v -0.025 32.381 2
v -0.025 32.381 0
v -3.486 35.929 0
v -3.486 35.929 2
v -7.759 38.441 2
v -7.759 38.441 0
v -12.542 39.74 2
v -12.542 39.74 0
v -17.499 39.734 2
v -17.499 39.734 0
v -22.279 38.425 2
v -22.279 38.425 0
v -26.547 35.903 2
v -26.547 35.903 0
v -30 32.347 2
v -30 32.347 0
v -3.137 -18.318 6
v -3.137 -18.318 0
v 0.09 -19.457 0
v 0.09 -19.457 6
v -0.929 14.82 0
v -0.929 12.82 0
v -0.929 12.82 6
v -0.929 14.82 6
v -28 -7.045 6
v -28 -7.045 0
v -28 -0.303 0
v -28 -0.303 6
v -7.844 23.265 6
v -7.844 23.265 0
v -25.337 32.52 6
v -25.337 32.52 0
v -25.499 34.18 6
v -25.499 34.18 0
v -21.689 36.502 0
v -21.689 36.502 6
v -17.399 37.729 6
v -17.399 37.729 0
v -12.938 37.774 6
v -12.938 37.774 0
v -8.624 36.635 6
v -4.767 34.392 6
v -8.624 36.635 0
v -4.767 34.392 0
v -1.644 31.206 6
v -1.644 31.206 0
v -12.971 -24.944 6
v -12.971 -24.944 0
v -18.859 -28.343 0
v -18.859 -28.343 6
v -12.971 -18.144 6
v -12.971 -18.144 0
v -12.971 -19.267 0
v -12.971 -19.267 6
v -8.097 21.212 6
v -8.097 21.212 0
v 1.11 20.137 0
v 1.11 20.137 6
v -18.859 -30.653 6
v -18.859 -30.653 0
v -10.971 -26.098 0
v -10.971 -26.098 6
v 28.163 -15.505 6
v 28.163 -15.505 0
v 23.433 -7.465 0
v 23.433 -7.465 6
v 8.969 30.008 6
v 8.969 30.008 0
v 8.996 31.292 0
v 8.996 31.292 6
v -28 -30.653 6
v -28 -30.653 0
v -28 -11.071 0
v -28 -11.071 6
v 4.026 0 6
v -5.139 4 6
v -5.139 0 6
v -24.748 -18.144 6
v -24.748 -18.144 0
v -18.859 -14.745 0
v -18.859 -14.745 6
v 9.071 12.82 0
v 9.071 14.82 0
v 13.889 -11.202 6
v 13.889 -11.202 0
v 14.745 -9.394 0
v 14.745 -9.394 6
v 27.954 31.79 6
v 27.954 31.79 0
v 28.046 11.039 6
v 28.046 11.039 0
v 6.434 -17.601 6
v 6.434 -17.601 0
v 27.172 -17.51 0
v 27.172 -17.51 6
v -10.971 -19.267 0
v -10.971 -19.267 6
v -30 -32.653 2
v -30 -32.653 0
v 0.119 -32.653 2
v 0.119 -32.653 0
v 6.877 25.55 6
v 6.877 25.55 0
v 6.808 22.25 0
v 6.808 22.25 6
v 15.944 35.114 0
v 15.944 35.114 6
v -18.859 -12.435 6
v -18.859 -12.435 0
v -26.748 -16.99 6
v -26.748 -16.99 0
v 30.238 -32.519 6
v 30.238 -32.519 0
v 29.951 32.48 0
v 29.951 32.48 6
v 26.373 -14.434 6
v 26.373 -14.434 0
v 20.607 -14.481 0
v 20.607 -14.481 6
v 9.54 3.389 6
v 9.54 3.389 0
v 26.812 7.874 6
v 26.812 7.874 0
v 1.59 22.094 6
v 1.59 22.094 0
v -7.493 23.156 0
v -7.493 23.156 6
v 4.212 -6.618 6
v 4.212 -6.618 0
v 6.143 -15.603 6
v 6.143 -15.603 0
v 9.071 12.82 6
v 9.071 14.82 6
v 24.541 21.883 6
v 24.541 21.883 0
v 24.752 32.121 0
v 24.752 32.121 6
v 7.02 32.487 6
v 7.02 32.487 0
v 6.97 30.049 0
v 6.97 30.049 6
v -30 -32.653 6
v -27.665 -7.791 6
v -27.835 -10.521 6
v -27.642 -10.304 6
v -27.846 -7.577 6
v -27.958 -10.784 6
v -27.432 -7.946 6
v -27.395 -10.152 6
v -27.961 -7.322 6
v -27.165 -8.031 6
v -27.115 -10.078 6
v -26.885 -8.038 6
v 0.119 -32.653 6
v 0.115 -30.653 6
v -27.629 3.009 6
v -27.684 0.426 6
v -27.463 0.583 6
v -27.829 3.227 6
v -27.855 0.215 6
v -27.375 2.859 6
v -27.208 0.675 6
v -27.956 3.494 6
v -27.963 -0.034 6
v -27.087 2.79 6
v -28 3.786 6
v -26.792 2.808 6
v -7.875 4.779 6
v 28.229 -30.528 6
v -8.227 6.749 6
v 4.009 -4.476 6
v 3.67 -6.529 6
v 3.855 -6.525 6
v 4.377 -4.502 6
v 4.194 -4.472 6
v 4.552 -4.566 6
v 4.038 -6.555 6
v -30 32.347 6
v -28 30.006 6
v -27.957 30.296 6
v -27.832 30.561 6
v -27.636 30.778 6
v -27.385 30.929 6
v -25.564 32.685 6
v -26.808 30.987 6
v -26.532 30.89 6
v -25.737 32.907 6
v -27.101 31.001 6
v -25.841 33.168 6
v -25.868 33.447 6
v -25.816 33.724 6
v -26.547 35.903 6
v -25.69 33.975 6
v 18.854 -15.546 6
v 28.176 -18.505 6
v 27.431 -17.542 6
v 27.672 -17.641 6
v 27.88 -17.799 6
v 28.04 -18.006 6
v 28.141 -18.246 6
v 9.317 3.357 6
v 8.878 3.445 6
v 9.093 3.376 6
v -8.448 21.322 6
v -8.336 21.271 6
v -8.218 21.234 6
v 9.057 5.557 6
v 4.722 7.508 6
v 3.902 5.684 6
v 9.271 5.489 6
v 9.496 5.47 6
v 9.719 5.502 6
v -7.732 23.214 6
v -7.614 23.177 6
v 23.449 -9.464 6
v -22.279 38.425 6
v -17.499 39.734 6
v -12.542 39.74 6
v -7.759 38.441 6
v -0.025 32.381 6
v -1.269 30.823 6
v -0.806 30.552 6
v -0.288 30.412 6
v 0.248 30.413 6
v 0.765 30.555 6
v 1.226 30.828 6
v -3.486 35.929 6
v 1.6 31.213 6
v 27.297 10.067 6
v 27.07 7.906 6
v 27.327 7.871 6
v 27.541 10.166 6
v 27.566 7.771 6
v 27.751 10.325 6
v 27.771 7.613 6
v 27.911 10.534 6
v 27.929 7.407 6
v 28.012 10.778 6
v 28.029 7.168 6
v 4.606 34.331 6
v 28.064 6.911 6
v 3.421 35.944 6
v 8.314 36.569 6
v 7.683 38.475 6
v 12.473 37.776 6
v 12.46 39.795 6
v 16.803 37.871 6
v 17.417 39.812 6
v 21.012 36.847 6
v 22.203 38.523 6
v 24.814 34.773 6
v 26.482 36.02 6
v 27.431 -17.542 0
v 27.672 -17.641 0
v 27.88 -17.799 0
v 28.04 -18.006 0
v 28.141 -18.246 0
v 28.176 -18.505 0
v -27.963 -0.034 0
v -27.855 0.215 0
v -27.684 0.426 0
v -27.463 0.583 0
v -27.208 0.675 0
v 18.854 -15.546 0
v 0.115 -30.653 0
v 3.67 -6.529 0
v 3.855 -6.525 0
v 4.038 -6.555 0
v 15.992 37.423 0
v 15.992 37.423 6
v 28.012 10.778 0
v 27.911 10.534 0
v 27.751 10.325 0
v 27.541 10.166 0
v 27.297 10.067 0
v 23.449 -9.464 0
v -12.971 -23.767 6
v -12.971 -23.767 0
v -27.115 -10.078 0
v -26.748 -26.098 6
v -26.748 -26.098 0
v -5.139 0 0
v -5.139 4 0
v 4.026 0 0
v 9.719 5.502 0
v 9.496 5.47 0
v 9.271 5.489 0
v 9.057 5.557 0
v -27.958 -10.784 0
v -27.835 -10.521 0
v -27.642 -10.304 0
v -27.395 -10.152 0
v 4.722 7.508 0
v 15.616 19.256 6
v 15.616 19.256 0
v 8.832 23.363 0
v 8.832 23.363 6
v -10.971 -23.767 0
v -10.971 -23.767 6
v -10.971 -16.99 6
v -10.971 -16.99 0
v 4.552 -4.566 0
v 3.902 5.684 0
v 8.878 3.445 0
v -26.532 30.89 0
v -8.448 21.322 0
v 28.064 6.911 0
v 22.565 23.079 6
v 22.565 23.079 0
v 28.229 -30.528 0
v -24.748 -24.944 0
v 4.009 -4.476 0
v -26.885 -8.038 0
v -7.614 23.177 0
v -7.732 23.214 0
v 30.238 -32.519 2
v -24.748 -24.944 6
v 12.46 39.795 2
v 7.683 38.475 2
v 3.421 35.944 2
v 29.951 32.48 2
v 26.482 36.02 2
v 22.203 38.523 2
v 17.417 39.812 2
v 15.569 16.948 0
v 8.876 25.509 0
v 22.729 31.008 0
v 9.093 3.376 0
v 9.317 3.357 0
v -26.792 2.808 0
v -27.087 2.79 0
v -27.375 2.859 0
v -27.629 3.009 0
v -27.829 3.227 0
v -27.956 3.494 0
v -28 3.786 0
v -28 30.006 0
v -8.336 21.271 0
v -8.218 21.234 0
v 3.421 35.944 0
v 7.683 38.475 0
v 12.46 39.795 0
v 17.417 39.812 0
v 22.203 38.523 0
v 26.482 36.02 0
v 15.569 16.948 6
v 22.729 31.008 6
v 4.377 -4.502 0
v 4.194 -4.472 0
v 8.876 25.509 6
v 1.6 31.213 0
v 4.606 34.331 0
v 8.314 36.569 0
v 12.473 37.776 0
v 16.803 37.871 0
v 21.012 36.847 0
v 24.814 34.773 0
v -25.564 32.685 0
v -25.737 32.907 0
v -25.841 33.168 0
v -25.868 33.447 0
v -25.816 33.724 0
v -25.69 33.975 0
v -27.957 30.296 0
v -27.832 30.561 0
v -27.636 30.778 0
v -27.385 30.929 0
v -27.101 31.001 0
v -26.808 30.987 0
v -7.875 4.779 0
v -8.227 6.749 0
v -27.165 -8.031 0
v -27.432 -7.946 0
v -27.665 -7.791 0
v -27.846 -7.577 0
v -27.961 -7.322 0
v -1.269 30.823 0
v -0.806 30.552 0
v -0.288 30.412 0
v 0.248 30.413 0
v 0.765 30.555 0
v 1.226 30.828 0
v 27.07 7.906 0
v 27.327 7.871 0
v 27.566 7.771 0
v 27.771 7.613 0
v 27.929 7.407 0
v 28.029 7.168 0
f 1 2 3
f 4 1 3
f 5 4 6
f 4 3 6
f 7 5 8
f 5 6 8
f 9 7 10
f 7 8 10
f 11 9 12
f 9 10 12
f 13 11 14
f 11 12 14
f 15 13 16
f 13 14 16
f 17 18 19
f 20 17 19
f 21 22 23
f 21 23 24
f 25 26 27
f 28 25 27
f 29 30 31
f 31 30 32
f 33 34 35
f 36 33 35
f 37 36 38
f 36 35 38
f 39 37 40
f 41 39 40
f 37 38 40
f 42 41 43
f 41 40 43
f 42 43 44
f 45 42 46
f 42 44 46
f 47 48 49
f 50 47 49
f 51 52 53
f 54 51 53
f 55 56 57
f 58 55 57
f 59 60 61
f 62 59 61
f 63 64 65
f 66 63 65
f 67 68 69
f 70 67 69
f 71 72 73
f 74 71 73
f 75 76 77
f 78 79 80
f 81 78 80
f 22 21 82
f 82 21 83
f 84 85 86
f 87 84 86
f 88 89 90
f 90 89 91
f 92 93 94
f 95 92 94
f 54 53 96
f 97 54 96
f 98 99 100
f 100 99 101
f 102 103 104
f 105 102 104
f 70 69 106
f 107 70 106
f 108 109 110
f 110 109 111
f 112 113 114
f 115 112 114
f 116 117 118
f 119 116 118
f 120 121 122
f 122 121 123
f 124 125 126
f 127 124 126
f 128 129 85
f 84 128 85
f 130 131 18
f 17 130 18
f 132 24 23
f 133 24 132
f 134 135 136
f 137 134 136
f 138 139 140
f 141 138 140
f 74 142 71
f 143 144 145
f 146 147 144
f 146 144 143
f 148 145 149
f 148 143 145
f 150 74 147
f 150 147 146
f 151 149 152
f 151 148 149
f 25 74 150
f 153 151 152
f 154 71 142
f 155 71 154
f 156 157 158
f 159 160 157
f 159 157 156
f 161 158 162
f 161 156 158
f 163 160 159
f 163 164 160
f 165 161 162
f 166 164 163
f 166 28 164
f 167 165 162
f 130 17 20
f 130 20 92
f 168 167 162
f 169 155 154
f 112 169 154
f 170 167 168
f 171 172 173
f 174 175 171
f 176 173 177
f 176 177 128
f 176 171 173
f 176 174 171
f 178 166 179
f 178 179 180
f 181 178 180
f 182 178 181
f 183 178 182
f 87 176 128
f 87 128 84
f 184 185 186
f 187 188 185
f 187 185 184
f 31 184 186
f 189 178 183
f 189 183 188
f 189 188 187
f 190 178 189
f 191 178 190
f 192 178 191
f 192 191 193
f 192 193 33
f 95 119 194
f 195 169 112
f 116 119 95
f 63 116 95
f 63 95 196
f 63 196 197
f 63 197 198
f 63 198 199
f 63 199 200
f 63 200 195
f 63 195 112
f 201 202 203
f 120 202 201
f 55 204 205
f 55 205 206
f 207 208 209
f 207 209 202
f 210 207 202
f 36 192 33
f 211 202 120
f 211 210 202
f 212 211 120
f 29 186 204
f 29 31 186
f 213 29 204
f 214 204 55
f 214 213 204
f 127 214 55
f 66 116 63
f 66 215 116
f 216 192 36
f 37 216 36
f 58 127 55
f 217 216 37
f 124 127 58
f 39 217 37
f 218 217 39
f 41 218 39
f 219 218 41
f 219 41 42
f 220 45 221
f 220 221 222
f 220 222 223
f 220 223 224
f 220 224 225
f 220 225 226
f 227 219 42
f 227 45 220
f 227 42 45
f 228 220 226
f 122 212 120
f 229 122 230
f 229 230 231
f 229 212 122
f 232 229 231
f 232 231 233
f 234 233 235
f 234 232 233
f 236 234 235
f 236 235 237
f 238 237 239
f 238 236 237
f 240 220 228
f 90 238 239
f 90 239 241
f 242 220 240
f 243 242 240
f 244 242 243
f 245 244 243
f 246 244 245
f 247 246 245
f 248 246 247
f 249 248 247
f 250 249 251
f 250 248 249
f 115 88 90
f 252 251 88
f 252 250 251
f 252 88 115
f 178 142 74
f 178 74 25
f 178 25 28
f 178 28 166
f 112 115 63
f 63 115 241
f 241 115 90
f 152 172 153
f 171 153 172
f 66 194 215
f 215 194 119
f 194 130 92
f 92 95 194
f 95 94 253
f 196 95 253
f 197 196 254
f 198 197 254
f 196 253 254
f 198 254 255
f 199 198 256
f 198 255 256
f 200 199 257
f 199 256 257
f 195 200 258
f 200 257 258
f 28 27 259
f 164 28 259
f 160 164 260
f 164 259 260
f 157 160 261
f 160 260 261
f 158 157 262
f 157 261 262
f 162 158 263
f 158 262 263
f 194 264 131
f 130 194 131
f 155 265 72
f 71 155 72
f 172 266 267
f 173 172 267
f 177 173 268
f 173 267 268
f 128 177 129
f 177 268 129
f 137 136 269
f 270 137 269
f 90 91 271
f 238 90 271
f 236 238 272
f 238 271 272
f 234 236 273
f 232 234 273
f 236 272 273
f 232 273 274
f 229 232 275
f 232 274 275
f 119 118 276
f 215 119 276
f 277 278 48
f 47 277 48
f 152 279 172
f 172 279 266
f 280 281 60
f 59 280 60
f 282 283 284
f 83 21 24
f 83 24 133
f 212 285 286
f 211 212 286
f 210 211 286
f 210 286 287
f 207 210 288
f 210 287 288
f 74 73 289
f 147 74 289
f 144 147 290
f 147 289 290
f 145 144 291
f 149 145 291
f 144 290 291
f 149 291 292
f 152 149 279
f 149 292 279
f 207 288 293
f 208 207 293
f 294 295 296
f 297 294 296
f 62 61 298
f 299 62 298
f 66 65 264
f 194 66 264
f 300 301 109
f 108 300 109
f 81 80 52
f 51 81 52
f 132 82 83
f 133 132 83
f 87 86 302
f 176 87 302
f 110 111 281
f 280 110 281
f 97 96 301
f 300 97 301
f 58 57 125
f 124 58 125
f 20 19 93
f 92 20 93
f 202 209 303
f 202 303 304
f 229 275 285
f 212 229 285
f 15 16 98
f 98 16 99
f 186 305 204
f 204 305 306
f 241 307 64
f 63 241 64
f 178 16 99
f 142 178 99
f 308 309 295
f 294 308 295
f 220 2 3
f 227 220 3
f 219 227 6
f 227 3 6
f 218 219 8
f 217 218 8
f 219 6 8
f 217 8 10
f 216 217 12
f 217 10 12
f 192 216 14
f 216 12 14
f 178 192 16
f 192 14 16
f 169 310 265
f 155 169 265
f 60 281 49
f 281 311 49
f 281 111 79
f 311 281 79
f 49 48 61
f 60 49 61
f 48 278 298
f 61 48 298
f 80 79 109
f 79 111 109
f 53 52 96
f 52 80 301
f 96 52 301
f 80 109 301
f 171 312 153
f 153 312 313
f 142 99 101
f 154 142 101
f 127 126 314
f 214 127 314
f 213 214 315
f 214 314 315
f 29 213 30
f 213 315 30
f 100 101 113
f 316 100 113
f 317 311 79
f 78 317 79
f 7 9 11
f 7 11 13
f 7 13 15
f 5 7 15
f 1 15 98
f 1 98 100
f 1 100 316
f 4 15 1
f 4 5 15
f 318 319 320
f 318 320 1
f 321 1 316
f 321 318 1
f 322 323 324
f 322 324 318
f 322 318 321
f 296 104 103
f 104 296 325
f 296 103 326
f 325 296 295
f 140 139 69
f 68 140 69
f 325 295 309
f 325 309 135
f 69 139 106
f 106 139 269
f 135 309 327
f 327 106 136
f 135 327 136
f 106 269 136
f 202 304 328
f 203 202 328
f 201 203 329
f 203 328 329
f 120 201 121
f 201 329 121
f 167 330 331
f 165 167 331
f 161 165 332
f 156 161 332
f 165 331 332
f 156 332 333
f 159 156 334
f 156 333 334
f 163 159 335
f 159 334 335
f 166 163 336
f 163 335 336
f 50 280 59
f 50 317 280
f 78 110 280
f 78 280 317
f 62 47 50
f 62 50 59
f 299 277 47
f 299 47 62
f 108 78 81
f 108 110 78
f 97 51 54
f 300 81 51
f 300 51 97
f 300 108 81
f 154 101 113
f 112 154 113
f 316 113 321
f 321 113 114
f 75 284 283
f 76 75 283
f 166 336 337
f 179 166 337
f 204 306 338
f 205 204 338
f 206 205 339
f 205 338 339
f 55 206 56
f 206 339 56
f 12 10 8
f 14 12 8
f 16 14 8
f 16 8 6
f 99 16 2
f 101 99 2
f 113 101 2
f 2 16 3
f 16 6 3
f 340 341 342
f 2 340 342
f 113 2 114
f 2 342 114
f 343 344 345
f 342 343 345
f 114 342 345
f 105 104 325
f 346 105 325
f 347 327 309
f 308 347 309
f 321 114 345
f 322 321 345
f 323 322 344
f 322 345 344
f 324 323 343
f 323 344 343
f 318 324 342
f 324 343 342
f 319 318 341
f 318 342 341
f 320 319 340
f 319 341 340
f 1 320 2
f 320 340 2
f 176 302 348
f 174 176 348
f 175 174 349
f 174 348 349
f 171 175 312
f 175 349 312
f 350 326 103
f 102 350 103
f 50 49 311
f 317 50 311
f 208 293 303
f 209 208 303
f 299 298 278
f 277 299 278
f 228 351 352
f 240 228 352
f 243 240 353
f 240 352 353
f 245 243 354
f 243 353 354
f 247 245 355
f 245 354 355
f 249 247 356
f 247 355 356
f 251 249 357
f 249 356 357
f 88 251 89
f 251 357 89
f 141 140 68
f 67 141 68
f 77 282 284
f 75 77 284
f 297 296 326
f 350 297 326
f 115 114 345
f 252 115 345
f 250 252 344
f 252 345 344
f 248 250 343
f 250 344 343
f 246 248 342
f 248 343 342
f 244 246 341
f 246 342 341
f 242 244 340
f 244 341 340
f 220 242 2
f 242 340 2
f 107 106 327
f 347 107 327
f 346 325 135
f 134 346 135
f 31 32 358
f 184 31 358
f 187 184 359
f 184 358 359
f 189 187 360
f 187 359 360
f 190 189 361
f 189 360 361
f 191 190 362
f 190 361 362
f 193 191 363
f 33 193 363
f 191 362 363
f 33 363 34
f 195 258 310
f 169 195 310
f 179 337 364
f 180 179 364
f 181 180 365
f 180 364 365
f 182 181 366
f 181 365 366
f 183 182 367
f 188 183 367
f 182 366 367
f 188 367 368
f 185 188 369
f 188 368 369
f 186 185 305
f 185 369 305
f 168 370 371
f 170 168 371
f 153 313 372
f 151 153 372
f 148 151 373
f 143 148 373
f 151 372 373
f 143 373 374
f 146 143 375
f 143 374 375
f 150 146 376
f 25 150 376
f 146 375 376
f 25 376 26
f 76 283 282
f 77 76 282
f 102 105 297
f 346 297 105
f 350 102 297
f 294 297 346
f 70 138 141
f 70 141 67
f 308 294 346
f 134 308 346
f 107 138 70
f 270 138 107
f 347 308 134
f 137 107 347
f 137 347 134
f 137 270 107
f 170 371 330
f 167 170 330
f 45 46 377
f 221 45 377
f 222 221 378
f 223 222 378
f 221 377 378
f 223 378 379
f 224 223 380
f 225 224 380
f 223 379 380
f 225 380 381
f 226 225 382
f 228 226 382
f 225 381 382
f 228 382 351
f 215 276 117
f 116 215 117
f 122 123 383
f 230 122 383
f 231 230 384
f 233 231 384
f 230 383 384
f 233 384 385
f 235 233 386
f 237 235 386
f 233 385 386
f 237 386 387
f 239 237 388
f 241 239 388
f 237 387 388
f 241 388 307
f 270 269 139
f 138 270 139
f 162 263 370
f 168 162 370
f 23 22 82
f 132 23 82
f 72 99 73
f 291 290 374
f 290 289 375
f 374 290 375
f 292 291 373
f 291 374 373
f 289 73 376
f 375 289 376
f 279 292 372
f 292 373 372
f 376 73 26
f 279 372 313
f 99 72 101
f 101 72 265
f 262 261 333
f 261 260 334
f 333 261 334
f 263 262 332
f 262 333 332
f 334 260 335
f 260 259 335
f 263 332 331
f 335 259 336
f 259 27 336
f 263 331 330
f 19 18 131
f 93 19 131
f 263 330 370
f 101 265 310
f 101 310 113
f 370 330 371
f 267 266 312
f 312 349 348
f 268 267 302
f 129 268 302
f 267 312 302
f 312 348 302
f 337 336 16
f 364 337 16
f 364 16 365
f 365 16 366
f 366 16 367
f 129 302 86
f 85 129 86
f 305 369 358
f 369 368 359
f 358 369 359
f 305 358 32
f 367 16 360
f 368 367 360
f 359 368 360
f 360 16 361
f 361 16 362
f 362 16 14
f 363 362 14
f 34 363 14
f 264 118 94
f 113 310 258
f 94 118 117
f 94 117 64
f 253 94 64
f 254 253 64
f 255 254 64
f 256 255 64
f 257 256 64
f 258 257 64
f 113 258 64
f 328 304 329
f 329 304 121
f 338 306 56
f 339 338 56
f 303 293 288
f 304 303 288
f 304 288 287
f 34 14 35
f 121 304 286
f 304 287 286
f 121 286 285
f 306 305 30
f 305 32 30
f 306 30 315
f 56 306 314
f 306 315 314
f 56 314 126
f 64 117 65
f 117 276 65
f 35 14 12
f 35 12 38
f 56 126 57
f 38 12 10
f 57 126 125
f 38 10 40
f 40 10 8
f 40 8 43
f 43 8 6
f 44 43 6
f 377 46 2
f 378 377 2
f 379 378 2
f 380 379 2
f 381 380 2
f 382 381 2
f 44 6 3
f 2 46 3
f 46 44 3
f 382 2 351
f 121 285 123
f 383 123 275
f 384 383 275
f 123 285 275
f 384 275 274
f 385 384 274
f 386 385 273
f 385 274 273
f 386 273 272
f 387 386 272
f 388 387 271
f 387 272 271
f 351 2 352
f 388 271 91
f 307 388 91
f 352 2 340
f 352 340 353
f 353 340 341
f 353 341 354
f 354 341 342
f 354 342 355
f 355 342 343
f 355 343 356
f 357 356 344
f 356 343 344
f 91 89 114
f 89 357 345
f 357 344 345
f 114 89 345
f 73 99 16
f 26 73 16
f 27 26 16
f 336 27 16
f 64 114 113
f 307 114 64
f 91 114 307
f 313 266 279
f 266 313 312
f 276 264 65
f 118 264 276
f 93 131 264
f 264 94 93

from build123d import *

# Parameters (mm, degrees)
F1_DEPTH = 6
F0_W     = 10
F0_H     = 2
F3_DEPTH = 2


# Not quite as in the source:
# - ends of sketch curves that miss each other by under 0.0002 mm in the source are joined


with BuildPart() as f1:
    # F0 (on Top) → F1 (new body)
    with BuildSketch(Plane.XY):
        with BuildLine():
            Line((-30, 32.3473930837), (-30, -32.6526069163))
            Line((-30, -32.6526069163), (0.1192900786, -32.6526069163))
            Line((0.1192900786, -32.6526069163), (30.2382853209, -32.5193386265))
            Line((30.2382853209, -32.5193386265), (29.9506809711, 32.4800250915))
            ThreePointArc((29.9506809711, 32.4800250915), (14.938018386, 39.9687184444), (-0.0245860478, 32.3805016191))
            ThreePointArc((-0.0245860478, 32.3805016191), (-15.0206194621, 39.9024393927), (-30, 32.3473930837))
        make_face()
        with BuildLine():
            Line((-18.8592523336, -30.6526069163), (-28, -30.6526069163))
            Line((-28, -30.6526069163), (-28, -11.0710615659))
            ThreePointArc((-28, -11.0710615659), (-27.7465009831, -10.4056772542), (-27.1145274354, -10.0776414803))
            Line((-27.1145274354, -10.0776414803), (3.6698389075, -6.5286347923))
            ThreePointArc((3.6698389075, -6.5286347923), (3.9474323278, -6.5354397125), (4.2124526409, -6.6183170169))
            Line((4.2124526409, -6.6183170169), (13.8885083595, -11.2017112184))
            Line((13.8885083595, -11.2017112184), (14.7446809555, -9.3942354963))
            Line((14.7446809555, -9.3942354963), (4.5516618753, -4.5659639457))
            ThreePointArc((4.5516618753, -4.5659639457), (4.2866415622, -4.4830866414), (4.0090481419, -4.4762817211))
            Line((4.0090481419, -4.4762817211), (-26.8854725646, -8.0379876659))
            ThreePointArc((-26.8854725646, -8.0379876659), (-27.6653843117, -7.7910685633), (-28, -7.0445675803))
            Line((-28, -7.0445675803), (-28, -0.3031208943))
            ThreePointArc((-28, -0.3031208943), (-27.777063149, 0.3263017478), (-27.2076542751, 0.6750813864))
            Line((-27.2076542751, 0.6750813864), (-7.8752691202, 4.7789896525))
            Line((-7.8752691202, 4.7789896525), (-8.2269339416, 6.748904602))
            Line((-8.2269339416, 6.748904602), (-26.7923457249, 2.8078106154))
            ThreePointArc((-26.7923457249, 2.8078106154), (-27.6294226421, 3.0089497471), (-28, 3.7860128961))
            Line((-28, 3.7860128961), (-28, 30.0059348114))
            ThreePointArc((-28, 30.0059348114), (-27.5159136269, 30.8625754184), (-26.5323337407, 30.8898399364))
            Line((-26.5323337407, 30.8898399364), (-8.4484836928, 21.3218373695))
            ThreePointArc((-8.4484836928, 21.3218373695), (-8.2777475055, 21.2508432682), (-8.0968589797, 21.212498134))
            Line((-8.0968589797, 21.212498134), (1.1104592122, 20.1367996633))
            Line((1.1104592122, 20.1367996633), (1.589740147, 22.0944080593))
            Line((1.589740147, 22.0944080593), (-7.4926699193, 23.1555134121))
            ThreePointArc((-7.4926699193, 23.1555134121), (-7.673558445, 23.1938585463), (-7.8442946323, 23.2648526476))
            Line((-7.8442946323, 23.2648526476), (-25.336579259, 32.5198632656))
            ThreePointArc((-25.336579259, 32.5198632656), (-25.864176528, 33.3065546609), (-25.4987813298, 34.1804703197))
            ThreePointArc((-25.4987813298, 34.1804703197), (-12.9378201369, 37.7743931473), (-1.6438298189, 31.2063028557))
            ThreePointArc((-1.6438298189, 31.2063028557), (-0.0201923897, 30.3945345597), (1.599837329, 31.2134789892))
            ThreePointArc((1.599837329, 31.2134789892), (14.6353510123, 37.9648321663), (27.9537138644, 31.790158276))
            Line((27.9537138644, 31.790158276), (28.0455327124, 11.0388493912))
            ThreePointArc((28.0455327124, 11.0388493912), (27.837893783, 10.4243595923), (27.2969034481, 10.0665312879))
            Line((27.2969034481, 10.0665312879), (9.7187459346, 5.5015014827))
            ThreePointArc((9.7187459346, 5.5015014827), (9.3831012246, 5.4729531105), (9.0570203938, 5.557473361))
            Line((9.0570203938, 5.557473361), (4.7224049972, 7.5080498132))
            Line((4.7224049972, 7.5080498132), (3.9016758092, 5.6842067279))
            Line((3.9016758092, 5.6842067279), (8.8783137321, 3.4447202094))
            ThreePointArc((8.8783137321, 3.4447202094), (9.2043945629, 3.3601999588), (9.5400392729, 3.388748331))
            Line((9.5400392729, 3.388748331), (26.8124465698, 7.8743751129))
            ThreePointArc((26.8124465698, 7.8743751129), (27.6738726331, 7.6988329735), (28.0637977276, 6.9109063742))
            Line((28.0637977276, 6.9109063742), (28.1629825794, -15.5051393439))
            Line((28.1629825794, -15.5051393439), (23.4331540021, -7.4645135844))
            Line((23.4331540021, -7.4645135844), (18.8542303832, -15.5463280182))
            Line((18.8542303832, -15.5463280182), (6.1433850081, -15.6025700214))
            Line((6.1433850081, -15.6025700214), (-3.1372315382, -18.3176588576))
            Line((-3.1372315382, -18.3176588576), (0.0900974588, -19.4573196774))
            Line((0.0900974588, -19.4573196774), (6.4342668447, -17.6013025272))
            Line((6.4342668447, -17.6013025272), (27.1718417329, -17.5095444483))
            ThreePointArc((27.1718417329, -17.5095444483), (27.8802375517, -17.7993060772), (28.1762566263, -18.5051099771))
            Line((28.1762566263, -18.5051099771), (28.2294555342, -30.528207569))
            Line((28.2294555342, -30.528207569), (0.1148653747, -30.6526069163))
            Line((0.1148653747, -30.6526069163), (-18.8592523336, -30.6526069163))
        make_face(mode=Mode.SUBTRACT)
        Polygon((20.6070848965, -14.4811387909), (23.4493978311, -9.4644476178), (26.3728233626, -14.4343084113), align=None, mode=Mode.SUBTRACT)
    extrude(amount=F1_DEPTH)


with BuildPart() as f1b:
    # F0 (on Top) → F1, piece 2 (new body)
    with BuildSketch(Plane.XY):
        Polygon((22.7288285259, 31.0075356756), (22.5648244879, 23.0787793067), (15.616318033, 19.2564327856), (8.8318156161, 23.3628426333), (8.8761979714, 25.5085024983), (6.8766256914, 25.549863074), (6.8083637966, 22.2497496149), (15.5685589539, 16.9475255974), (24.5405172283, 21.8829651369), (24.7522803454, 32.120628694), (15.9920851882, 37.4228527116), (7.0201269138, 32.487413172), (6.9696869869, 30.0489007039), (8.9692592668, 30.0075401282), (8.9958196542, 31.2915990022), (15.9443261091, 35.1139455234), align=None)
    extrude(amount=F1_DEPTH)


with BuildPart() as f1c:
    # F0 (on Top) → F1, piece 3 (new body)
    with BuildSketch(Plane.XY):
        with Locations((4.0708723292, 13.8201162443)):
            Rectangle(F0_W, F0_H)
    extrude(amount=F1_DEPTH)


with BuildPart() as f1d:
    # F0 (on Top) → F1, piece 4 (new body)
    with BuildSketch(Plane.XY):
        Polygon((-5.1392655546, 4), (-5.1392655546, 0), (4.0258858353, 0), align=None)
    extrude(amount=F1_DEPTH)


with BuildPart() as f1e:
    # F0 (on Top) → F1, piece 5 (new body)
    with BuildSketch(Plane.XY):
        Polygon((-26.7476101638, -26.0982613996), (-18.8592523336, -30.6526069163), (-10.9708945035, -26.0982613996), (-10.9708945035, -23.7670542747), (-12.9708945035, -23.7670542747), (-12.9708945035, -24.9435608612), (-18.8592523336, -28.3432058396), (-24.7476101638, -24.9435608612), (-24.7476101638, -18.1442709045), (-18.8592523336, -14.7446259262), (-12.9708945035, -18.1442709045), (-12.9708945035, -19.2670542747), (-10.9708945035, -19.2670542747), (-10.9708945035, -16.9895703661), (-18.8592523336, -12.4352248494), (-26.7476101638, -16.9895703661), align=None)
    extrude(amount=F1_DEPTH)


with BuildPart() as f3:
    # F2 (on Top) → F3 (new body)
    with BuildSketch(Plane.XY):
        with BuildLine():
            Line((-30, 32.3473930837), (-30, -32.6526069163))
            Line((-30, -32.6526069163), (0.1192900786, -32.6526069163))
            Line((0.1192900786, -32.6526069163), (30.2382853209, -32.5193386265))
            Line((30.2382853209, -32.5193386265), (29.9506809711, 32.4800250915))
            ThreePointArc((29.9506809711, 32.4800250915), (14.938018386, 39.9687184444), (-0.0245860478, 32.3805016191))
            ThreePointArc((-0.0245860478, 32.3805016191), (-15.0206194621, 39.9024393927), (-30, 32.3473930837))
        make_face()
    extrude(amount=F3_DEPTH)


solid = Compound([f1.part, f1b.part, f1c.part, f1d.part, f1e.part, f3.part])
